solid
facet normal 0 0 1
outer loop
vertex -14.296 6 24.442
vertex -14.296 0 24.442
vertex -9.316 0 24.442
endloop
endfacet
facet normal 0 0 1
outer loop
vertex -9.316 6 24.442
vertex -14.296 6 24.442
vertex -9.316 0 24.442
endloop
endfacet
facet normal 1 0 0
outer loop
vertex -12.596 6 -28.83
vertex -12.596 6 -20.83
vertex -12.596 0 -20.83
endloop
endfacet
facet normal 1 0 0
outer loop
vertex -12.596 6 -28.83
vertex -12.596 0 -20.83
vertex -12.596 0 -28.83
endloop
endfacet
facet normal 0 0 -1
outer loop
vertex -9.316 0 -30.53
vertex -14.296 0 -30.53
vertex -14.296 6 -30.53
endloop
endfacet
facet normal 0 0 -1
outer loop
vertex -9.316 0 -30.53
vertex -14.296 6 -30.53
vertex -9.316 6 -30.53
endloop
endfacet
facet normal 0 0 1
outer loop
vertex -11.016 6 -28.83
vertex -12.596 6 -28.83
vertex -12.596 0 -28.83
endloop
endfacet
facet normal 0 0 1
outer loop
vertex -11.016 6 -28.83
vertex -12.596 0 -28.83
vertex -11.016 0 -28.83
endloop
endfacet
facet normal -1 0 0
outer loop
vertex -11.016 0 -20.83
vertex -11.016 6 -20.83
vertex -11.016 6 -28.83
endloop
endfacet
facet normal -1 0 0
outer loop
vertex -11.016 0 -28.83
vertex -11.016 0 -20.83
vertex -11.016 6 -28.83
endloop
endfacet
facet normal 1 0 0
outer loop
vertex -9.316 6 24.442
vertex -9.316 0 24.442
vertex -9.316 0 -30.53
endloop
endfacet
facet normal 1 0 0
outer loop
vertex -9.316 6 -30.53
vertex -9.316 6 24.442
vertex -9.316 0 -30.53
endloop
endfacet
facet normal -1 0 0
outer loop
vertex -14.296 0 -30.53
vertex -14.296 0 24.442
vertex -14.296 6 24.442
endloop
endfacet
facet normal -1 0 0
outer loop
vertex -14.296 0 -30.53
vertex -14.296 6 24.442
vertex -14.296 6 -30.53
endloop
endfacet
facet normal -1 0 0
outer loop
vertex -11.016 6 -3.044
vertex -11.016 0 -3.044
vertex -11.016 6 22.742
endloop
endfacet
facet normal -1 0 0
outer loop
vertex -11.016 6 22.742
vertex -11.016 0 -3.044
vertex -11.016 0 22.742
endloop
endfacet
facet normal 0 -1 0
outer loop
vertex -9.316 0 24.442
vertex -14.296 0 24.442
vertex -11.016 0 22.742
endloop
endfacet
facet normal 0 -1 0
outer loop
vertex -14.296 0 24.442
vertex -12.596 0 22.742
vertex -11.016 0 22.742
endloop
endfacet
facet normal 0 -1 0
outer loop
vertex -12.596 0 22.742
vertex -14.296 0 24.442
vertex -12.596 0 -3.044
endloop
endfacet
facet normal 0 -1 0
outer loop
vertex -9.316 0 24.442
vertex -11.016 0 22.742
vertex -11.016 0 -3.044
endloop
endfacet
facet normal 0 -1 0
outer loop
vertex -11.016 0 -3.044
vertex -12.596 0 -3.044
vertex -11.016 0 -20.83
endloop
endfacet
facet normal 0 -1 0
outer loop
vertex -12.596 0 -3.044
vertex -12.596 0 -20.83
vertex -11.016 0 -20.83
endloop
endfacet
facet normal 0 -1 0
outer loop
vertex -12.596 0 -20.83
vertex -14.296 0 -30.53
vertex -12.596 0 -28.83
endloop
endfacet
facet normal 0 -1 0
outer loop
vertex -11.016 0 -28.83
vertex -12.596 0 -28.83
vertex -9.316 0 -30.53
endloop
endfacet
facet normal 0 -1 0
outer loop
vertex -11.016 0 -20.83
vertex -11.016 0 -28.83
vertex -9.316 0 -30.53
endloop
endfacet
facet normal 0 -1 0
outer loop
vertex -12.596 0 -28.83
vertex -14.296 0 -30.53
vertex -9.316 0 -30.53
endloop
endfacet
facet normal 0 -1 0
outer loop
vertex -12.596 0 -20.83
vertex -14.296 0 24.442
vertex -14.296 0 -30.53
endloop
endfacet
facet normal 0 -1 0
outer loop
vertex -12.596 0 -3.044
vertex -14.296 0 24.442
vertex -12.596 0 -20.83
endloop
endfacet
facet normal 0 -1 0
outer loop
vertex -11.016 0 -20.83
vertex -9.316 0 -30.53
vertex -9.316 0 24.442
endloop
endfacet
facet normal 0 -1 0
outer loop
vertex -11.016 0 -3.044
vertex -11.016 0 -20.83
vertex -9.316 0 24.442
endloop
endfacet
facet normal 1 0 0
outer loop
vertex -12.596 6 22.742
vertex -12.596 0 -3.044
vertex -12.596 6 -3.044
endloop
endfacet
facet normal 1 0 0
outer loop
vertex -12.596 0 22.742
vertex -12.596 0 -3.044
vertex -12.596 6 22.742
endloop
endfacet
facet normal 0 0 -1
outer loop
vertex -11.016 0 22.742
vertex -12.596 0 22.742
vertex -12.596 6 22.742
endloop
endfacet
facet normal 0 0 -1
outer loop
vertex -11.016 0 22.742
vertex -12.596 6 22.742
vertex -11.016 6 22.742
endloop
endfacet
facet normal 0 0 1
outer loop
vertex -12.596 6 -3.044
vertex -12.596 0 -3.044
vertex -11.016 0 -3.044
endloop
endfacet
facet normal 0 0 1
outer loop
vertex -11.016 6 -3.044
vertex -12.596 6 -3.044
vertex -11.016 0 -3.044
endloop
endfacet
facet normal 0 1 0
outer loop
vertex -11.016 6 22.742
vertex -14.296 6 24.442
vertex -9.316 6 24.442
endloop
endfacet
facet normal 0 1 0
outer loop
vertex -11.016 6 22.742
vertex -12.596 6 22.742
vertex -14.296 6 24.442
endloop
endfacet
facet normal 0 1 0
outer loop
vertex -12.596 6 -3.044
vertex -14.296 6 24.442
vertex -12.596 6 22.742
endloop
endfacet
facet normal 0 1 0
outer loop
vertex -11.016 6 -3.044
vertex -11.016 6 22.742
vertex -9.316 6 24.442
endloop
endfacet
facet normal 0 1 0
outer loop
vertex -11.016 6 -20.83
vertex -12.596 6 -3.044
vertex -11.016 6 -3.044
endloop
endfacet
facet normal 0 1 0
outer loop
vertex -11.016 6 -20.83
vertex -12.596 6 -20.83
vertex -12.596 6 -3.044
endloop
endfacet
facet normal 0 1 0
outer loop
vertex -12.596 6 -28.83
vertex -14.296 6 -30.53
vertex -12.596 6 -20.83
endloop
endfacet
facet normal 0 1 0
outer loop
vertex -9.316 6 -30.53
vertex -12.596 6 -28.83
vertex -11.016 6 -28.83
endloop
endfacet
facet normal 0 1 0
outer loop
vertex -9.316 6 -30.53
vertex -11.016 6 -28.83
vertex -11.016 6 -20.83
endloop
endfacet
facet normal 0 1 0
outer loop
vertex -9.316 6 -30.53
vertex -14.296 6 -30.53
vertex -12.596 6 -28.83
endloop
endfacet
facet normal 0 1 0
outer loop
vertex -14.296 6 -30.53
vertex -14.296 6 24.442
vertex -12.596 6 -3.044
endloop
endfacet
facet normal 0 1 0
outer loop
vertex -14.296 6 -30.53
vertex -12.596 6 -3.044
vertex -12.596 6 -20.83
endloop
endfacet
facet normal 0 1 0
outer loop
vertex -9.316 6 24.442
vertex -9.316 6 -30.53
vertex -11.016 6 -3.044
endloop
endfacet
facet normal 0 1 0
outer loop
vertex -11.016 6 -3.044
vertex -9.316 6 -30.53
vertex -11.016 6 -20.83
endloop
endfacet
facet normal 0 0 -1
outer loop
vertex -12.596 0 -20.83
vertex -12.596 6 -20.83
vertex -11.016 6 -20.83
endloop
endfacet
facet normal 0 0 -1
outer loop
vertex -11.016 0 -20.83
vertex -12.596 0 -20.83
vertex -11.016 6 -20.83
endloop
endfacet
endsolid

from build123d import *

# Parameters (mm, degrees)
SKETCH1_W           = 4.980670257
SKETCH1_H           = 54.9718421
BOSS_EXTRUDE1_DEPTH = 6
SKETCH2_W           = 1.580670257
SKETCH2_H           = 8
CUT_EXTRUDE2_DEPTH  = 7
SKETCH4_W           = 1.580670257
SKETCH4_H           = 25.78592105
CUT_EXTRUDE3_DEPTH  = 7


with BuildPart() as part:
    # Sketch1 → Boss-Extrude1 (new body)
    with BuildSketch(Plane(origin=(0, 0, 0), x_dir=(1, 0, 0), z_dir=(0, 1, 0))):
        with Locations((-11.806033203, 3.043742935)):
            Rectangle(SKETCH1_W, SKETCH1_H)
    extrude(amount=BOSS_EXTRUDE1_DEPTH)

    # Sketch2 → Cut-Extrude2 (cut)
    with BuildSketch(Plane(origin=(0, 6, 0), x_dir=(1, 0, 0), z_dir=(0, 1, 0))):
        with Locations((-11.806033203, 24.829663985)):
            Rectangle(SKETCH2_W, SKETCH2_H)
    extrude(amount=-CUT_EXTRUDE2_DEPTH, mode=Mode.SUBTRACT)

    # Sketch4 → Cut-Extrude3 (cut)
    with BuildSketch(Plane.XZ):
        with Locations((-11.806033203, 9.84921759)):
            Rectangle(SKETCH4_W, SKETCH4_H)
    extrude(amount=-CUT_EXTRUDE3_DEPTH, mode=Mode.SUBTRACT)


solid = part.part
